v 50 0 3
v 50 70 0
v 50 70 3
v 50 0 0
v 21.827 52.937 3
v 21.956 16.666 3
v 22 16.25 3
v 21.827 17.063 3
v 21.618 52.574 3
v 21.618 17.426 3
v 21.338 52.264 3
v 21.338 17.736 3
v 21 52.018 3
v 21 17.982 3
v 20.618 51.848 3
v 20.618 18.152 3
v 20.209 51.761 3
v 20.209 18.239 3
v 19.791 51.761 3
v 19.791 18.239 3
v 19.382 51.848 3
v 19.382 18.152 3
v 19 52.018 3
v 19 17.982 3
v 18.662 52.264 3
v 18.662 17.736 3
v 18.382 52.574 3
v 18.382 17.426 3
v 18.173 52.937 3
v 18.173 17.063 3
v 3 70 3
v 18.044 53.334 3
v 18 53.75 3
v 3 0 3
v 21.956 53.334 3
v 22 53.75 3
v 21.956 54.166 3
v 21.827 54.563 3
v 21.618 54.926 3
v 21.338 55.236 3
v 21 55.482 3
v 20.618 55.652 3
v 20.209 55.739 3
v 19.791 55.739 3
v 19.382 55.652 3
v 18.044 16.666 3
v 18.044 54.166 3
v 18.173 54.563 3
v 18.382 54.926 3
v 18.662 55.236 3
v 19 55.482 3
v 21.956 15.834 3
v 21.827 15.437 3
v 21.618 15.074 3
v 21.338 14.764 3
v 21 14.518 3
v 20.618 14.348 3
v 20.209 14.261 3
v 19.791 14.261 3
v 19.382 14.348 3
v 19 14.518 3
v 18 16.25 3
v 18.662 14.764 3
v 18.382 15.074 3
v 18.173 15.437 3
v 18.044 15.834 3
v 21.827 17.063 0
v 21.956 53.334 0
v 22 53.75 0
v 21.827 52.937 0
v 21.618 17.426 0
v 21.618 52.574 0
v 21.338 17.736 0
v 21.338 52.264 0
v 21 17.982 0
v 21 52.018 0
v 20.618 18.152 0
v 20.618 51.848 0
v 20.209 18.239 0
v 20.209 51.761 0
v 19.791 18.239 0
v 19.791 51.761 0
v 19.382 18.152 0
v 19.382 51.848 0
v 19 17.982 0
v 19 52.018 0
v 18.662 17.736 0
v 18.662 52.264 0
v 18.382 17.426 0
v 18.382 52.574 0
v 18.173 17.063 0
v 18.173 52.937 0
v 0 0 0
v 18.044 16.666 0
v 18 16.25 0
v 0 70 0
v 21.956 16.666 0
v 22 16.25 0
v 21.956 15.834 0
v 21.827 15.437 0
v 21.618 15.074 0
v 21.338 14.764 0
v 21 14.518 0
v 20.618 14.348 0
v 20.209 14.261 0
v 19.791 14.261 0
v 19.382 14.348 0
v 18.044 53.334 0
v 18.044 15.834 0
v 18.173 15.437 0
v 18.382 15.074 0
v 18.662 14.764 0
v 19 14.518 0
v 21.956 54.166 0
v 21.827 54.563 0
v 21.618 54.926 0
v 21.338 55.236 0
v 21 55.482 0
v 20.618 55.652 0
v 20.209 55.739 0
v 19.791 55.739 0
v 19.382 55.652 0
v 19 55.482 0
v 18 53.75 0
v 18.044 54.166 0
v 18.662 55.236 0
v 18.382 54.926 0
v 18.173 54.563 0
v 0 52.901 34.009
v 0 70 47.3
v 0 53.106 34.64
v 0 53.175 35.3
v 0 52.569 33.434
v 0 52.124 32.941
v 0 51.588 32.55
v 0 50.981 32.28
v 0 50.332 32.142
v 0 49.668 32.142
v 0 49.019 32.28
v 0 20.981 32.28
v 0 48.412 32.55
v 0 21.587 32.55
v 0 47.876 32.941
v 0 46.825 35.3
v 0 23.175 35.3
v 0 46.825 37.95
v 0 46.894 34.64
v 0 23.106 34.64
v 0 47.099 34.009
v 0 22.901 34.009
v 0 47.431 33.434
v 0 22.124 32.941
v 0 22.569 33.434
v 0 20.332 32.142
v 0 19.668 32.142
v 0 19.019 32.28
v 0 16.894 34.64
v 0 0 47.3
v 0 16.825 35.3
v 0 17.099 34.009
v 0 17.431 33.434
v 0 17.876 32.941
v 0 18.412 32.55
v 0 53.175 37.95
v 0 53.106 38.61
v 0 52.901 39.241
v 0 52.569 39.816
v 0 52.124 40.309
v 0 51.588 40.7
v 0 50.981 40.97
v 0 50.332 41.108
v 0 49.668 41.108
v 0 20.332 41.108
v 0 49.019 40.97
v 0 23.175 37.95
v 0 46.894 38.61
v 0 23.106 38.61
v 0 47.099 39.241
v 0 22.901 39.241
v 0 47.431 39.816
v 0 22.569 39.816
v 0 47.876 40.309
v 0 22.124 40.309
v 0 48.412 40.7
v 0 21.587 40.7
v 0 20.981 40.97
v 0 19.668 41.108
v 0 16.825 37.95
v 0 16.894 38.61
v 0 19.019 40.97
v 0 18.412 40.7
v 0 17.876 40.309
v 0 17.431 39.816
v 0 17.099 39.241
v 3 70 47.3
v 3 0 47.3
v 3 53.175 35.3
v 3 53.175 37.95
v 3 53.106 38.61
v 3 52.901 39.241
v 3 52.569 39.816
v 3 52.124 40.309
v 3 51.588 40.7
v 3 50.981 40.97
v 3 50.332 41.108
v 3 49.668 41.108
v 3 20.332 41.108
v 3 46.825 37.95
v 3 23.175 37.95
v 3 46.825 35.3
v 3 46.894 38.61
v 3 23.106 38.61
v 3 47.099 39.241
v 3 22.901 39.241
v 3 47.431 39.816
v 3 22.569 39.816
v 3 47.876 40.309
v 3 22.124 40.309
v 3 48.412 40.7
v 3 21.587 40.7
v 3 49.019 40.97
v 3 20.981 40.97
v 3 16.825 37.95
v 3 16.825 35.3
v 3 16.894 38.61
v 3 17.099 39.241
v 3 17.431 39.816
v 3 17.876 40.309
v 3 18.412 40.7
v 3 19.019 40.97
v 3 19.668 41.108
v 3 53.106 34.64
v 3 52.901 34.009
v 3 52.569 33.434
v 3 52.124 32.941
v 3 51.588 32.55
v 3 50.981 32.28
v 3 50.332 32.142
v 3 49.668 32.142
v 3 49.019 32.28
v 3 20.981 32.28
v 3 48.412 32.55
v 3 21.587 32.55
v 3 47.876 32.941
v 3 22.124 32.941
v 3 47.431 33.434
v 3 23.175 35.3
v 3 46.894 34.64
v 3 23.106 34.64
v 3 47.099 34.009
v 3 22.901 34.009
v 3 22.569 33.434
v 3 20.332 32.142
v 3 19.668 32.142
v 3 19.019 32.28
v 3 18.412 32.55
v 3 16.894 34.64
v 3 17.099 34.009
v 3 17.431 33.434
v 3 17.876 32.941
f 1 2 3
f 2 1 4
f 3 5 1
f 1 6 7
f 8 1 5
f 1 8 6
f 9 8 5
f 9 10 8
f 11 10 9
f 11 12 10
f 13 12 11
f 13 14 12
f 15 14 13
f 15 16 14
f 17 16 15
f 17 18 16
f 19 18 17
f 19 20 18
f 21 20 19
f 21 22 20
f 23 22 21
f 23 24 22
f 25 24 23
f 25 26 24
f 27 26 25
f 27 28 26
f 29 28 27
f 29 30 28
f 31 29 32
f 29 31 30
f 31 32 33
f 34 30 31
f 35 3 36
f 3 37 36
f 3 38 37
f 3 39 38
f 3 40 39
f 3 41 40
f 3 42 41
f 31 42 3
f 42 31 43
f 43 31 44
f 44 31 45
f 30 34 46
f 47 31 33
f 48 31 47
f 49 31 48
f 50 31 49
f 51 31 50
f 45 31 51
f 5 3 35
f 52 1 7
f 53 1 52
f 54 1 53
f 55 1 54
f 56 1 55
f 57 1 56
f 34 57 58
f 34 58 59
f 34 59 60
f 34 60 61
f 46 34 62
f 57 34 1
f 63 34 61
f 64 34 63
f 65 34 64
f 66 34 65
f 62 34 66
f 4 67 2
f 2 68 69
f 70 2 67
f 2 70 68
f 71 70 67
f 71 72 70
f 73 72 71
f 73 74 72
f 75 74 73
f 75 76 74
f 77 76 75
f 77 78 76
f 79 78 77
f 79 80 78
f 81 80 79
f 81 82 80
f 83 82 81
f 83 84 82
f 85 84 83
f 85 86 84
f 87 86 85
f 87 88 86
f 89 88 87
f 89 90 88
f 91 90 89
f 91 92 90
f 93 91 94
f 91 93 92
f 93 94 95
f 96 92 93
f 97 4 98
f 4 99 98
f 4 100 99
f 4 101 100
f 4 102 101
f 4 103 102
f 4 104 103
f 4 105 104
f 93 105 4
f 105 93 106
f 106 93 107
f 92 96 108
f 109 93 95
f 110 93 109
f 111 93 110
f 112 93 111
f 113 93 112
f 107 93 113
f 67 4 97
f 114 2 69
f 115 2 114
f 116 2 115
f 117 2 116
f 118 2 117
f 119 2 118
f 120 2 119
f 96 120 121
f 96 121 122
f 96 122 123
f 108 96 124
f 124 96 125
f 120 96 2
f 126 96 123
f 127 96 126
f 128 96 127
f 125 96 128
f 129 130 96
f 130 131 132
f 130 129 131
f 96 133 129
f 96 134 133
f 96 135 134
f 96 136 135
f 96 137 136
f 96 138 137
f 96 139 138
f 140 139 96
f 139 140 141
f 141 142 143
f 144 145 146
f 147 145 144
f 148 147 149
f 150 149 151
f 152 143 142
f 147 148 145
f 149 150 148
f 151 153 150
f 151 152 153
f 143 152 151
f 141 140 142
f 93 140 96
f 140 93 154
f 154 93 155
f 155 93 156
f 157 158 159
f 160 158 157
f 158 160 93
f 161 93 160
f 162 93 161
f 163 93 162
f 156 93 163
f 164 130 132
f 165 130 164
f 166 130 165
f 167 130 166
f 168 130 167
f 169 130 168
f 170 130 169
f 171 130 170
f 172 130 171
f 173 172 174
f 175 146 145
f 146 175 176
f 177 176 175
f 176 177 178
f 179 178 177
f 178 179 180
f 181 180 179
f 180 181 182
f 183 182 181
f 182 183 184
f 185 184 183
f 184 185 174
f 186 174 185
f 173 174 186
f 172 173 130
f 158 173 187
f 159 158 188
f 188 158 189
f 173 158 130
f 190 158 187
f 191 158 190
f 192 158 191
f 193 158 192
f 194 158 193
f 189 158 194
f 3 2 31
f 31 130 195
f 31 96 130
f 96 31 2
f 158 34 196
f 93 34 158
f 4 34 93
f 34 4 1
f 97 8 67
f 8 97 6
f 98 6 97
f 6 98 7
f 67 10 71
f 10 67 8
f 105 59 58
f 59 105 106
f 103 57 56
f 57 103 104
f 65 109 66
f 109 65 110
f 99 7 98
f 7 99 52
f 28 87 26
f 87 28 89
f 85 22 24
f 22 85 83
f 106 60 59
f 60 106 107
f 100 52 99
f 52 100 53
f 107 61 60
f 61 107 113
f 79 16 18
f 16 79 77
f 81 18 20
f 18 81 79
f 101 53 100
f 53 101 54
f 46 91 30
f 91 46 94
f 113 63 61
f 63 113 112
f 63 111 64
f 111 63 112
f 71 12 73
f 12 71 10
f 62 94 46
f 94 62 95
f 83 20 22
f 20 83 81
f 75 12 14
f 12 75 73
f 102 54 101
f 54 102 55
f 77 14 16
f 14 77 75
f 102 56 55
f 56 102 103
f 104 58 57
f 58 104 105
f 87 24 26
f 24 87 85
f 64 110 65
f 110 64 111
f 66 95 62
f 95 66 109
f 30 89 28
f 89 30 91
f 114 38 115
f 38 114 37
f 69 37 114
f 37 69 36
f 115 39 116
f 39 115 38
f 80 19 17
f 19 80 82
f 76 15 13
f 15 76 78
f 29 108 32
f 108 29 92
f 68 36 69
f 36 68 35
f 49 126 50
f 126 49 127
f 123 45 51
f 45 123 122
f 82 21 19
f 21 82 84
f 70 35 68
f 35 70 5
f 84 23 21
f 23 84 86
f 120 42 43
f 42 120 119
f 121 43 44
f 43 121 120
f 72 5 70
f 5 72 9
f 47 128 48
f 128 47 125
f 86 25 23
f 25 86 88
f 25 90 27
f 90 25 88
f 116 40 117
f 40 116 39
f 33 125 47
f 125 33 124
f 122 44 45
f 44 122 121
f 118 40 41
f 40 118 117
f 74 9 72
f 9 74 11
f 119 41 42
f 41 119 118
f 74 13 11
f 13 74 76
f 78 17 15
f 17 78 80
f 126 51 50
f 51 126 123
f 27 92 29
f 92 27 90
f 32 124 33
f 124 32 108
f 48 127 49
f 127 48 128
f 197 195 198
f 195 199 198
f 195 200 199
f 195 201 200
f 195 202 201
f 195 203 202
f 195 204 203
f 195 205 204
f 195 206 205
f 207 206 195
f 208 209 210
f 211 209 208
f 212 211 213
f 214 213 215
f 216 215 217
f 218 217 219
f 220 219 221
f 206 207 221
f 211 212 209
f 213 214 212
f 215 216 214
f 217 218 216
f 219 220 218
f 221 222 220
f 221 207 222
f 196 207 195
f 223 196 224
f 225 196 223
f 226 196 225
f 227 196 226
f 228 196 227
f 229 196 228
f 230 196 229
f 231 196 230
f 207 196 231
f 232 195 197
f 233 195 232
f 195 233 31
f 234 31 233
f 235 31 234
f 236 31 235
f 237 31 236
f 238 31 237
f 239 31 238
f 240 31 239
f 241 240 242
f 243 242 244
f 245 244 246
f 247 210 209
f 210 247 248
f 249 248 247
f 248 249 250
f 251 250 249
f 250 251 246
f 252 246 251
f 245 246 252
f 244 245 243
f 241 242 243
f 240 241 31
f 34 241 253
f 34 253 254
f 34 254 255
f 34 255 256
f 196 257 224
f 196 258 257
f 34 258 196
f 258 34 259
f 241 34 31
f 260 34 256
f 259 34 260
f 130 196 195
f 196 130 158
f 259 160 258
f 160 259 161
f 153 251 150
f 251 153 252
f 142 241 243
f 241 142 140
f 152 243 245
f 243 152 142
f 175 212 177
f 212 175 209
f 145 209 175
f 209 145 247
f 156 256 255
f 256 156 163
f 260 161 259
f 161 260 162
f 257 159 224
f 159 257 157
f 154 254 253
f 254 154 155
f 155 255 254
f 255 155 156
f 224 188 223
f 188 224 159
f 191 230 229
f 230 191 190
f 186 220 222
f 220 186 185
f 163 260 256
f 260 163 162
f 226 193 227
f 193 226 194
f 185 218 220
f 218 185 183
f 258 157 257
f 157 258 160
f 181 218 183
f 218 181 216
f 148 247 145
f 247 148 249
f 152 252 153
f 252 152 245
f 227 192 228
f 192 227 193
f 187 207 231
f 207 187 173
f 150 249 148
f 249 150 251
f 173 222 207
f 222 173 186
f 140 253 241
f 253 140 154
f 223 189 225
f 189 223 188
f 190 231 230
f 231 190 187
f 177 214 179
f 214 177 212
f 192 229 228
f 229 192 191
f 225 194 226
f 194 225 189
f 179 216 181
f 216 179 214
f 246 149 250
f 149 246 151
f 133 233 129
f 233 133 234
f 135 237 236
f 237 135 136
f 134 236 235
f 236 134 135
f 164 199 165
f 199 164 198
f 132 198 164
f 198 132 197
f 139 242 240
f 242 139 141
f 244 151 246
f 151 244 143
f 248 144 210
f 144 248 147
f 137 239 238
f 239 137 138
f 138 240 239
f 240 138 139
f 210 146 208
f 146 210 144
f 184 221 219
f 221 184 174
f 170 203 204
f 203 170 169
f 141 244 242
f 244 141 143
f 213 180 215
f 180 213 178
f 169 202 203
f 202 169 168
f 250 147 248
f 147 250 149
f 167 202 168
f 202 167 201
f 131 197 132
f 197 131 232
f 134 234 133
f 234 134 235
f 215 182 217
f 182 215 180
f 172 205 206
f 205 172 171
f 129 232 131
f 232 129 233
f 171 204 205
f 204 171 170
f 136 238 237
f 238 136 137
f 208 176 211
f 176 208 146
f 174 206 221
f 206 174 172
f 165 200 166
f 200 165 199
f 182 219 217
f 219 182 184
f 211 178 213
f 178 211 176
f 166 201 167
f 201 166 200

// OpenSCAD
// Approximation of Firebox II rackmount bracket with rack holes

module bracket() {
    thickness = 3; // Metal thickness in mm
    height = 70;
    width = 50; // Width of the central bracket portion

    rack_hole_dia = 4;
    Total_rack_width = 482.60;
    Internal_rack_space = 450.85;
    Rack_hole_space = 465.12;
    rack_spacing = 465.1; // Horizontal spacing for 19-inch rack
    rack_hole_y1 = 20; // Distance from top
    rack_hole_y2 = height - 20; // Distance from bottom
    device_width = 394; //device width in mm
    flange_depth = (Total_rack_width - device_width)/2; //depth of flange
    // Slot size parameters
    slot_dia = 6.35; // 1/4 inch diameter
    slot_len = 9;    // total length of slot
    slot_offset_from_edge = 3;
    
    // Compute slot center Z
    slot_center_z = flange_depth - (3+ slot_len); //flange_depth - slot_offset_from_edge - slot_dia/2;

    // Base plate with mounting holes
    difference() {
        cube([width, height, thickness]);

        // Internal mounting holes (for device, 37.5mm apart)
        translate([20, (70-37.5)/2, 0])
            cylinder(h=thickness+1, d=4, $fn=30);
        translate([20 , (70-37.5)/2 + 37.5, 0])
            cylinder(h=thickness+1, d=4, $fn=30);

        
    }

    // Flange
    translate([0, 0, thickness])
        difference() {
            cube([thickness, height, flange_depth]);
            // Rack mount holes - elongated (1/4 inch diameter, slotted)
            translate([-0.1, rack_hole_y1, slot_center_z])
                rotate([90, 0, 90])
                    hull() {
                        translate([0, 0, 0])
                            cylinder(h = thickness + 1, d = slot_dia, $fn = 30);
                        translate([0, slot_len - slot_dia, 0])
                            cylinder(h = thickness + 1, d = slot_dia, $fn = 30);
                    }
            
            translate([-0.1, rack_hole_y2, slot_center_z])
                rotate([90, 0, 90])
                    hull() {
                        translate([0, 0, 0])
                            cylinder(h = thickness + 1, d = slot_dia, $fn = 30);
                        translate([0, slot_len - slot_dia, 0])
                            cylinder(h = thickness + 1, d = slot_dia, $fn = 30);
                    }
        }
}

bracket();
